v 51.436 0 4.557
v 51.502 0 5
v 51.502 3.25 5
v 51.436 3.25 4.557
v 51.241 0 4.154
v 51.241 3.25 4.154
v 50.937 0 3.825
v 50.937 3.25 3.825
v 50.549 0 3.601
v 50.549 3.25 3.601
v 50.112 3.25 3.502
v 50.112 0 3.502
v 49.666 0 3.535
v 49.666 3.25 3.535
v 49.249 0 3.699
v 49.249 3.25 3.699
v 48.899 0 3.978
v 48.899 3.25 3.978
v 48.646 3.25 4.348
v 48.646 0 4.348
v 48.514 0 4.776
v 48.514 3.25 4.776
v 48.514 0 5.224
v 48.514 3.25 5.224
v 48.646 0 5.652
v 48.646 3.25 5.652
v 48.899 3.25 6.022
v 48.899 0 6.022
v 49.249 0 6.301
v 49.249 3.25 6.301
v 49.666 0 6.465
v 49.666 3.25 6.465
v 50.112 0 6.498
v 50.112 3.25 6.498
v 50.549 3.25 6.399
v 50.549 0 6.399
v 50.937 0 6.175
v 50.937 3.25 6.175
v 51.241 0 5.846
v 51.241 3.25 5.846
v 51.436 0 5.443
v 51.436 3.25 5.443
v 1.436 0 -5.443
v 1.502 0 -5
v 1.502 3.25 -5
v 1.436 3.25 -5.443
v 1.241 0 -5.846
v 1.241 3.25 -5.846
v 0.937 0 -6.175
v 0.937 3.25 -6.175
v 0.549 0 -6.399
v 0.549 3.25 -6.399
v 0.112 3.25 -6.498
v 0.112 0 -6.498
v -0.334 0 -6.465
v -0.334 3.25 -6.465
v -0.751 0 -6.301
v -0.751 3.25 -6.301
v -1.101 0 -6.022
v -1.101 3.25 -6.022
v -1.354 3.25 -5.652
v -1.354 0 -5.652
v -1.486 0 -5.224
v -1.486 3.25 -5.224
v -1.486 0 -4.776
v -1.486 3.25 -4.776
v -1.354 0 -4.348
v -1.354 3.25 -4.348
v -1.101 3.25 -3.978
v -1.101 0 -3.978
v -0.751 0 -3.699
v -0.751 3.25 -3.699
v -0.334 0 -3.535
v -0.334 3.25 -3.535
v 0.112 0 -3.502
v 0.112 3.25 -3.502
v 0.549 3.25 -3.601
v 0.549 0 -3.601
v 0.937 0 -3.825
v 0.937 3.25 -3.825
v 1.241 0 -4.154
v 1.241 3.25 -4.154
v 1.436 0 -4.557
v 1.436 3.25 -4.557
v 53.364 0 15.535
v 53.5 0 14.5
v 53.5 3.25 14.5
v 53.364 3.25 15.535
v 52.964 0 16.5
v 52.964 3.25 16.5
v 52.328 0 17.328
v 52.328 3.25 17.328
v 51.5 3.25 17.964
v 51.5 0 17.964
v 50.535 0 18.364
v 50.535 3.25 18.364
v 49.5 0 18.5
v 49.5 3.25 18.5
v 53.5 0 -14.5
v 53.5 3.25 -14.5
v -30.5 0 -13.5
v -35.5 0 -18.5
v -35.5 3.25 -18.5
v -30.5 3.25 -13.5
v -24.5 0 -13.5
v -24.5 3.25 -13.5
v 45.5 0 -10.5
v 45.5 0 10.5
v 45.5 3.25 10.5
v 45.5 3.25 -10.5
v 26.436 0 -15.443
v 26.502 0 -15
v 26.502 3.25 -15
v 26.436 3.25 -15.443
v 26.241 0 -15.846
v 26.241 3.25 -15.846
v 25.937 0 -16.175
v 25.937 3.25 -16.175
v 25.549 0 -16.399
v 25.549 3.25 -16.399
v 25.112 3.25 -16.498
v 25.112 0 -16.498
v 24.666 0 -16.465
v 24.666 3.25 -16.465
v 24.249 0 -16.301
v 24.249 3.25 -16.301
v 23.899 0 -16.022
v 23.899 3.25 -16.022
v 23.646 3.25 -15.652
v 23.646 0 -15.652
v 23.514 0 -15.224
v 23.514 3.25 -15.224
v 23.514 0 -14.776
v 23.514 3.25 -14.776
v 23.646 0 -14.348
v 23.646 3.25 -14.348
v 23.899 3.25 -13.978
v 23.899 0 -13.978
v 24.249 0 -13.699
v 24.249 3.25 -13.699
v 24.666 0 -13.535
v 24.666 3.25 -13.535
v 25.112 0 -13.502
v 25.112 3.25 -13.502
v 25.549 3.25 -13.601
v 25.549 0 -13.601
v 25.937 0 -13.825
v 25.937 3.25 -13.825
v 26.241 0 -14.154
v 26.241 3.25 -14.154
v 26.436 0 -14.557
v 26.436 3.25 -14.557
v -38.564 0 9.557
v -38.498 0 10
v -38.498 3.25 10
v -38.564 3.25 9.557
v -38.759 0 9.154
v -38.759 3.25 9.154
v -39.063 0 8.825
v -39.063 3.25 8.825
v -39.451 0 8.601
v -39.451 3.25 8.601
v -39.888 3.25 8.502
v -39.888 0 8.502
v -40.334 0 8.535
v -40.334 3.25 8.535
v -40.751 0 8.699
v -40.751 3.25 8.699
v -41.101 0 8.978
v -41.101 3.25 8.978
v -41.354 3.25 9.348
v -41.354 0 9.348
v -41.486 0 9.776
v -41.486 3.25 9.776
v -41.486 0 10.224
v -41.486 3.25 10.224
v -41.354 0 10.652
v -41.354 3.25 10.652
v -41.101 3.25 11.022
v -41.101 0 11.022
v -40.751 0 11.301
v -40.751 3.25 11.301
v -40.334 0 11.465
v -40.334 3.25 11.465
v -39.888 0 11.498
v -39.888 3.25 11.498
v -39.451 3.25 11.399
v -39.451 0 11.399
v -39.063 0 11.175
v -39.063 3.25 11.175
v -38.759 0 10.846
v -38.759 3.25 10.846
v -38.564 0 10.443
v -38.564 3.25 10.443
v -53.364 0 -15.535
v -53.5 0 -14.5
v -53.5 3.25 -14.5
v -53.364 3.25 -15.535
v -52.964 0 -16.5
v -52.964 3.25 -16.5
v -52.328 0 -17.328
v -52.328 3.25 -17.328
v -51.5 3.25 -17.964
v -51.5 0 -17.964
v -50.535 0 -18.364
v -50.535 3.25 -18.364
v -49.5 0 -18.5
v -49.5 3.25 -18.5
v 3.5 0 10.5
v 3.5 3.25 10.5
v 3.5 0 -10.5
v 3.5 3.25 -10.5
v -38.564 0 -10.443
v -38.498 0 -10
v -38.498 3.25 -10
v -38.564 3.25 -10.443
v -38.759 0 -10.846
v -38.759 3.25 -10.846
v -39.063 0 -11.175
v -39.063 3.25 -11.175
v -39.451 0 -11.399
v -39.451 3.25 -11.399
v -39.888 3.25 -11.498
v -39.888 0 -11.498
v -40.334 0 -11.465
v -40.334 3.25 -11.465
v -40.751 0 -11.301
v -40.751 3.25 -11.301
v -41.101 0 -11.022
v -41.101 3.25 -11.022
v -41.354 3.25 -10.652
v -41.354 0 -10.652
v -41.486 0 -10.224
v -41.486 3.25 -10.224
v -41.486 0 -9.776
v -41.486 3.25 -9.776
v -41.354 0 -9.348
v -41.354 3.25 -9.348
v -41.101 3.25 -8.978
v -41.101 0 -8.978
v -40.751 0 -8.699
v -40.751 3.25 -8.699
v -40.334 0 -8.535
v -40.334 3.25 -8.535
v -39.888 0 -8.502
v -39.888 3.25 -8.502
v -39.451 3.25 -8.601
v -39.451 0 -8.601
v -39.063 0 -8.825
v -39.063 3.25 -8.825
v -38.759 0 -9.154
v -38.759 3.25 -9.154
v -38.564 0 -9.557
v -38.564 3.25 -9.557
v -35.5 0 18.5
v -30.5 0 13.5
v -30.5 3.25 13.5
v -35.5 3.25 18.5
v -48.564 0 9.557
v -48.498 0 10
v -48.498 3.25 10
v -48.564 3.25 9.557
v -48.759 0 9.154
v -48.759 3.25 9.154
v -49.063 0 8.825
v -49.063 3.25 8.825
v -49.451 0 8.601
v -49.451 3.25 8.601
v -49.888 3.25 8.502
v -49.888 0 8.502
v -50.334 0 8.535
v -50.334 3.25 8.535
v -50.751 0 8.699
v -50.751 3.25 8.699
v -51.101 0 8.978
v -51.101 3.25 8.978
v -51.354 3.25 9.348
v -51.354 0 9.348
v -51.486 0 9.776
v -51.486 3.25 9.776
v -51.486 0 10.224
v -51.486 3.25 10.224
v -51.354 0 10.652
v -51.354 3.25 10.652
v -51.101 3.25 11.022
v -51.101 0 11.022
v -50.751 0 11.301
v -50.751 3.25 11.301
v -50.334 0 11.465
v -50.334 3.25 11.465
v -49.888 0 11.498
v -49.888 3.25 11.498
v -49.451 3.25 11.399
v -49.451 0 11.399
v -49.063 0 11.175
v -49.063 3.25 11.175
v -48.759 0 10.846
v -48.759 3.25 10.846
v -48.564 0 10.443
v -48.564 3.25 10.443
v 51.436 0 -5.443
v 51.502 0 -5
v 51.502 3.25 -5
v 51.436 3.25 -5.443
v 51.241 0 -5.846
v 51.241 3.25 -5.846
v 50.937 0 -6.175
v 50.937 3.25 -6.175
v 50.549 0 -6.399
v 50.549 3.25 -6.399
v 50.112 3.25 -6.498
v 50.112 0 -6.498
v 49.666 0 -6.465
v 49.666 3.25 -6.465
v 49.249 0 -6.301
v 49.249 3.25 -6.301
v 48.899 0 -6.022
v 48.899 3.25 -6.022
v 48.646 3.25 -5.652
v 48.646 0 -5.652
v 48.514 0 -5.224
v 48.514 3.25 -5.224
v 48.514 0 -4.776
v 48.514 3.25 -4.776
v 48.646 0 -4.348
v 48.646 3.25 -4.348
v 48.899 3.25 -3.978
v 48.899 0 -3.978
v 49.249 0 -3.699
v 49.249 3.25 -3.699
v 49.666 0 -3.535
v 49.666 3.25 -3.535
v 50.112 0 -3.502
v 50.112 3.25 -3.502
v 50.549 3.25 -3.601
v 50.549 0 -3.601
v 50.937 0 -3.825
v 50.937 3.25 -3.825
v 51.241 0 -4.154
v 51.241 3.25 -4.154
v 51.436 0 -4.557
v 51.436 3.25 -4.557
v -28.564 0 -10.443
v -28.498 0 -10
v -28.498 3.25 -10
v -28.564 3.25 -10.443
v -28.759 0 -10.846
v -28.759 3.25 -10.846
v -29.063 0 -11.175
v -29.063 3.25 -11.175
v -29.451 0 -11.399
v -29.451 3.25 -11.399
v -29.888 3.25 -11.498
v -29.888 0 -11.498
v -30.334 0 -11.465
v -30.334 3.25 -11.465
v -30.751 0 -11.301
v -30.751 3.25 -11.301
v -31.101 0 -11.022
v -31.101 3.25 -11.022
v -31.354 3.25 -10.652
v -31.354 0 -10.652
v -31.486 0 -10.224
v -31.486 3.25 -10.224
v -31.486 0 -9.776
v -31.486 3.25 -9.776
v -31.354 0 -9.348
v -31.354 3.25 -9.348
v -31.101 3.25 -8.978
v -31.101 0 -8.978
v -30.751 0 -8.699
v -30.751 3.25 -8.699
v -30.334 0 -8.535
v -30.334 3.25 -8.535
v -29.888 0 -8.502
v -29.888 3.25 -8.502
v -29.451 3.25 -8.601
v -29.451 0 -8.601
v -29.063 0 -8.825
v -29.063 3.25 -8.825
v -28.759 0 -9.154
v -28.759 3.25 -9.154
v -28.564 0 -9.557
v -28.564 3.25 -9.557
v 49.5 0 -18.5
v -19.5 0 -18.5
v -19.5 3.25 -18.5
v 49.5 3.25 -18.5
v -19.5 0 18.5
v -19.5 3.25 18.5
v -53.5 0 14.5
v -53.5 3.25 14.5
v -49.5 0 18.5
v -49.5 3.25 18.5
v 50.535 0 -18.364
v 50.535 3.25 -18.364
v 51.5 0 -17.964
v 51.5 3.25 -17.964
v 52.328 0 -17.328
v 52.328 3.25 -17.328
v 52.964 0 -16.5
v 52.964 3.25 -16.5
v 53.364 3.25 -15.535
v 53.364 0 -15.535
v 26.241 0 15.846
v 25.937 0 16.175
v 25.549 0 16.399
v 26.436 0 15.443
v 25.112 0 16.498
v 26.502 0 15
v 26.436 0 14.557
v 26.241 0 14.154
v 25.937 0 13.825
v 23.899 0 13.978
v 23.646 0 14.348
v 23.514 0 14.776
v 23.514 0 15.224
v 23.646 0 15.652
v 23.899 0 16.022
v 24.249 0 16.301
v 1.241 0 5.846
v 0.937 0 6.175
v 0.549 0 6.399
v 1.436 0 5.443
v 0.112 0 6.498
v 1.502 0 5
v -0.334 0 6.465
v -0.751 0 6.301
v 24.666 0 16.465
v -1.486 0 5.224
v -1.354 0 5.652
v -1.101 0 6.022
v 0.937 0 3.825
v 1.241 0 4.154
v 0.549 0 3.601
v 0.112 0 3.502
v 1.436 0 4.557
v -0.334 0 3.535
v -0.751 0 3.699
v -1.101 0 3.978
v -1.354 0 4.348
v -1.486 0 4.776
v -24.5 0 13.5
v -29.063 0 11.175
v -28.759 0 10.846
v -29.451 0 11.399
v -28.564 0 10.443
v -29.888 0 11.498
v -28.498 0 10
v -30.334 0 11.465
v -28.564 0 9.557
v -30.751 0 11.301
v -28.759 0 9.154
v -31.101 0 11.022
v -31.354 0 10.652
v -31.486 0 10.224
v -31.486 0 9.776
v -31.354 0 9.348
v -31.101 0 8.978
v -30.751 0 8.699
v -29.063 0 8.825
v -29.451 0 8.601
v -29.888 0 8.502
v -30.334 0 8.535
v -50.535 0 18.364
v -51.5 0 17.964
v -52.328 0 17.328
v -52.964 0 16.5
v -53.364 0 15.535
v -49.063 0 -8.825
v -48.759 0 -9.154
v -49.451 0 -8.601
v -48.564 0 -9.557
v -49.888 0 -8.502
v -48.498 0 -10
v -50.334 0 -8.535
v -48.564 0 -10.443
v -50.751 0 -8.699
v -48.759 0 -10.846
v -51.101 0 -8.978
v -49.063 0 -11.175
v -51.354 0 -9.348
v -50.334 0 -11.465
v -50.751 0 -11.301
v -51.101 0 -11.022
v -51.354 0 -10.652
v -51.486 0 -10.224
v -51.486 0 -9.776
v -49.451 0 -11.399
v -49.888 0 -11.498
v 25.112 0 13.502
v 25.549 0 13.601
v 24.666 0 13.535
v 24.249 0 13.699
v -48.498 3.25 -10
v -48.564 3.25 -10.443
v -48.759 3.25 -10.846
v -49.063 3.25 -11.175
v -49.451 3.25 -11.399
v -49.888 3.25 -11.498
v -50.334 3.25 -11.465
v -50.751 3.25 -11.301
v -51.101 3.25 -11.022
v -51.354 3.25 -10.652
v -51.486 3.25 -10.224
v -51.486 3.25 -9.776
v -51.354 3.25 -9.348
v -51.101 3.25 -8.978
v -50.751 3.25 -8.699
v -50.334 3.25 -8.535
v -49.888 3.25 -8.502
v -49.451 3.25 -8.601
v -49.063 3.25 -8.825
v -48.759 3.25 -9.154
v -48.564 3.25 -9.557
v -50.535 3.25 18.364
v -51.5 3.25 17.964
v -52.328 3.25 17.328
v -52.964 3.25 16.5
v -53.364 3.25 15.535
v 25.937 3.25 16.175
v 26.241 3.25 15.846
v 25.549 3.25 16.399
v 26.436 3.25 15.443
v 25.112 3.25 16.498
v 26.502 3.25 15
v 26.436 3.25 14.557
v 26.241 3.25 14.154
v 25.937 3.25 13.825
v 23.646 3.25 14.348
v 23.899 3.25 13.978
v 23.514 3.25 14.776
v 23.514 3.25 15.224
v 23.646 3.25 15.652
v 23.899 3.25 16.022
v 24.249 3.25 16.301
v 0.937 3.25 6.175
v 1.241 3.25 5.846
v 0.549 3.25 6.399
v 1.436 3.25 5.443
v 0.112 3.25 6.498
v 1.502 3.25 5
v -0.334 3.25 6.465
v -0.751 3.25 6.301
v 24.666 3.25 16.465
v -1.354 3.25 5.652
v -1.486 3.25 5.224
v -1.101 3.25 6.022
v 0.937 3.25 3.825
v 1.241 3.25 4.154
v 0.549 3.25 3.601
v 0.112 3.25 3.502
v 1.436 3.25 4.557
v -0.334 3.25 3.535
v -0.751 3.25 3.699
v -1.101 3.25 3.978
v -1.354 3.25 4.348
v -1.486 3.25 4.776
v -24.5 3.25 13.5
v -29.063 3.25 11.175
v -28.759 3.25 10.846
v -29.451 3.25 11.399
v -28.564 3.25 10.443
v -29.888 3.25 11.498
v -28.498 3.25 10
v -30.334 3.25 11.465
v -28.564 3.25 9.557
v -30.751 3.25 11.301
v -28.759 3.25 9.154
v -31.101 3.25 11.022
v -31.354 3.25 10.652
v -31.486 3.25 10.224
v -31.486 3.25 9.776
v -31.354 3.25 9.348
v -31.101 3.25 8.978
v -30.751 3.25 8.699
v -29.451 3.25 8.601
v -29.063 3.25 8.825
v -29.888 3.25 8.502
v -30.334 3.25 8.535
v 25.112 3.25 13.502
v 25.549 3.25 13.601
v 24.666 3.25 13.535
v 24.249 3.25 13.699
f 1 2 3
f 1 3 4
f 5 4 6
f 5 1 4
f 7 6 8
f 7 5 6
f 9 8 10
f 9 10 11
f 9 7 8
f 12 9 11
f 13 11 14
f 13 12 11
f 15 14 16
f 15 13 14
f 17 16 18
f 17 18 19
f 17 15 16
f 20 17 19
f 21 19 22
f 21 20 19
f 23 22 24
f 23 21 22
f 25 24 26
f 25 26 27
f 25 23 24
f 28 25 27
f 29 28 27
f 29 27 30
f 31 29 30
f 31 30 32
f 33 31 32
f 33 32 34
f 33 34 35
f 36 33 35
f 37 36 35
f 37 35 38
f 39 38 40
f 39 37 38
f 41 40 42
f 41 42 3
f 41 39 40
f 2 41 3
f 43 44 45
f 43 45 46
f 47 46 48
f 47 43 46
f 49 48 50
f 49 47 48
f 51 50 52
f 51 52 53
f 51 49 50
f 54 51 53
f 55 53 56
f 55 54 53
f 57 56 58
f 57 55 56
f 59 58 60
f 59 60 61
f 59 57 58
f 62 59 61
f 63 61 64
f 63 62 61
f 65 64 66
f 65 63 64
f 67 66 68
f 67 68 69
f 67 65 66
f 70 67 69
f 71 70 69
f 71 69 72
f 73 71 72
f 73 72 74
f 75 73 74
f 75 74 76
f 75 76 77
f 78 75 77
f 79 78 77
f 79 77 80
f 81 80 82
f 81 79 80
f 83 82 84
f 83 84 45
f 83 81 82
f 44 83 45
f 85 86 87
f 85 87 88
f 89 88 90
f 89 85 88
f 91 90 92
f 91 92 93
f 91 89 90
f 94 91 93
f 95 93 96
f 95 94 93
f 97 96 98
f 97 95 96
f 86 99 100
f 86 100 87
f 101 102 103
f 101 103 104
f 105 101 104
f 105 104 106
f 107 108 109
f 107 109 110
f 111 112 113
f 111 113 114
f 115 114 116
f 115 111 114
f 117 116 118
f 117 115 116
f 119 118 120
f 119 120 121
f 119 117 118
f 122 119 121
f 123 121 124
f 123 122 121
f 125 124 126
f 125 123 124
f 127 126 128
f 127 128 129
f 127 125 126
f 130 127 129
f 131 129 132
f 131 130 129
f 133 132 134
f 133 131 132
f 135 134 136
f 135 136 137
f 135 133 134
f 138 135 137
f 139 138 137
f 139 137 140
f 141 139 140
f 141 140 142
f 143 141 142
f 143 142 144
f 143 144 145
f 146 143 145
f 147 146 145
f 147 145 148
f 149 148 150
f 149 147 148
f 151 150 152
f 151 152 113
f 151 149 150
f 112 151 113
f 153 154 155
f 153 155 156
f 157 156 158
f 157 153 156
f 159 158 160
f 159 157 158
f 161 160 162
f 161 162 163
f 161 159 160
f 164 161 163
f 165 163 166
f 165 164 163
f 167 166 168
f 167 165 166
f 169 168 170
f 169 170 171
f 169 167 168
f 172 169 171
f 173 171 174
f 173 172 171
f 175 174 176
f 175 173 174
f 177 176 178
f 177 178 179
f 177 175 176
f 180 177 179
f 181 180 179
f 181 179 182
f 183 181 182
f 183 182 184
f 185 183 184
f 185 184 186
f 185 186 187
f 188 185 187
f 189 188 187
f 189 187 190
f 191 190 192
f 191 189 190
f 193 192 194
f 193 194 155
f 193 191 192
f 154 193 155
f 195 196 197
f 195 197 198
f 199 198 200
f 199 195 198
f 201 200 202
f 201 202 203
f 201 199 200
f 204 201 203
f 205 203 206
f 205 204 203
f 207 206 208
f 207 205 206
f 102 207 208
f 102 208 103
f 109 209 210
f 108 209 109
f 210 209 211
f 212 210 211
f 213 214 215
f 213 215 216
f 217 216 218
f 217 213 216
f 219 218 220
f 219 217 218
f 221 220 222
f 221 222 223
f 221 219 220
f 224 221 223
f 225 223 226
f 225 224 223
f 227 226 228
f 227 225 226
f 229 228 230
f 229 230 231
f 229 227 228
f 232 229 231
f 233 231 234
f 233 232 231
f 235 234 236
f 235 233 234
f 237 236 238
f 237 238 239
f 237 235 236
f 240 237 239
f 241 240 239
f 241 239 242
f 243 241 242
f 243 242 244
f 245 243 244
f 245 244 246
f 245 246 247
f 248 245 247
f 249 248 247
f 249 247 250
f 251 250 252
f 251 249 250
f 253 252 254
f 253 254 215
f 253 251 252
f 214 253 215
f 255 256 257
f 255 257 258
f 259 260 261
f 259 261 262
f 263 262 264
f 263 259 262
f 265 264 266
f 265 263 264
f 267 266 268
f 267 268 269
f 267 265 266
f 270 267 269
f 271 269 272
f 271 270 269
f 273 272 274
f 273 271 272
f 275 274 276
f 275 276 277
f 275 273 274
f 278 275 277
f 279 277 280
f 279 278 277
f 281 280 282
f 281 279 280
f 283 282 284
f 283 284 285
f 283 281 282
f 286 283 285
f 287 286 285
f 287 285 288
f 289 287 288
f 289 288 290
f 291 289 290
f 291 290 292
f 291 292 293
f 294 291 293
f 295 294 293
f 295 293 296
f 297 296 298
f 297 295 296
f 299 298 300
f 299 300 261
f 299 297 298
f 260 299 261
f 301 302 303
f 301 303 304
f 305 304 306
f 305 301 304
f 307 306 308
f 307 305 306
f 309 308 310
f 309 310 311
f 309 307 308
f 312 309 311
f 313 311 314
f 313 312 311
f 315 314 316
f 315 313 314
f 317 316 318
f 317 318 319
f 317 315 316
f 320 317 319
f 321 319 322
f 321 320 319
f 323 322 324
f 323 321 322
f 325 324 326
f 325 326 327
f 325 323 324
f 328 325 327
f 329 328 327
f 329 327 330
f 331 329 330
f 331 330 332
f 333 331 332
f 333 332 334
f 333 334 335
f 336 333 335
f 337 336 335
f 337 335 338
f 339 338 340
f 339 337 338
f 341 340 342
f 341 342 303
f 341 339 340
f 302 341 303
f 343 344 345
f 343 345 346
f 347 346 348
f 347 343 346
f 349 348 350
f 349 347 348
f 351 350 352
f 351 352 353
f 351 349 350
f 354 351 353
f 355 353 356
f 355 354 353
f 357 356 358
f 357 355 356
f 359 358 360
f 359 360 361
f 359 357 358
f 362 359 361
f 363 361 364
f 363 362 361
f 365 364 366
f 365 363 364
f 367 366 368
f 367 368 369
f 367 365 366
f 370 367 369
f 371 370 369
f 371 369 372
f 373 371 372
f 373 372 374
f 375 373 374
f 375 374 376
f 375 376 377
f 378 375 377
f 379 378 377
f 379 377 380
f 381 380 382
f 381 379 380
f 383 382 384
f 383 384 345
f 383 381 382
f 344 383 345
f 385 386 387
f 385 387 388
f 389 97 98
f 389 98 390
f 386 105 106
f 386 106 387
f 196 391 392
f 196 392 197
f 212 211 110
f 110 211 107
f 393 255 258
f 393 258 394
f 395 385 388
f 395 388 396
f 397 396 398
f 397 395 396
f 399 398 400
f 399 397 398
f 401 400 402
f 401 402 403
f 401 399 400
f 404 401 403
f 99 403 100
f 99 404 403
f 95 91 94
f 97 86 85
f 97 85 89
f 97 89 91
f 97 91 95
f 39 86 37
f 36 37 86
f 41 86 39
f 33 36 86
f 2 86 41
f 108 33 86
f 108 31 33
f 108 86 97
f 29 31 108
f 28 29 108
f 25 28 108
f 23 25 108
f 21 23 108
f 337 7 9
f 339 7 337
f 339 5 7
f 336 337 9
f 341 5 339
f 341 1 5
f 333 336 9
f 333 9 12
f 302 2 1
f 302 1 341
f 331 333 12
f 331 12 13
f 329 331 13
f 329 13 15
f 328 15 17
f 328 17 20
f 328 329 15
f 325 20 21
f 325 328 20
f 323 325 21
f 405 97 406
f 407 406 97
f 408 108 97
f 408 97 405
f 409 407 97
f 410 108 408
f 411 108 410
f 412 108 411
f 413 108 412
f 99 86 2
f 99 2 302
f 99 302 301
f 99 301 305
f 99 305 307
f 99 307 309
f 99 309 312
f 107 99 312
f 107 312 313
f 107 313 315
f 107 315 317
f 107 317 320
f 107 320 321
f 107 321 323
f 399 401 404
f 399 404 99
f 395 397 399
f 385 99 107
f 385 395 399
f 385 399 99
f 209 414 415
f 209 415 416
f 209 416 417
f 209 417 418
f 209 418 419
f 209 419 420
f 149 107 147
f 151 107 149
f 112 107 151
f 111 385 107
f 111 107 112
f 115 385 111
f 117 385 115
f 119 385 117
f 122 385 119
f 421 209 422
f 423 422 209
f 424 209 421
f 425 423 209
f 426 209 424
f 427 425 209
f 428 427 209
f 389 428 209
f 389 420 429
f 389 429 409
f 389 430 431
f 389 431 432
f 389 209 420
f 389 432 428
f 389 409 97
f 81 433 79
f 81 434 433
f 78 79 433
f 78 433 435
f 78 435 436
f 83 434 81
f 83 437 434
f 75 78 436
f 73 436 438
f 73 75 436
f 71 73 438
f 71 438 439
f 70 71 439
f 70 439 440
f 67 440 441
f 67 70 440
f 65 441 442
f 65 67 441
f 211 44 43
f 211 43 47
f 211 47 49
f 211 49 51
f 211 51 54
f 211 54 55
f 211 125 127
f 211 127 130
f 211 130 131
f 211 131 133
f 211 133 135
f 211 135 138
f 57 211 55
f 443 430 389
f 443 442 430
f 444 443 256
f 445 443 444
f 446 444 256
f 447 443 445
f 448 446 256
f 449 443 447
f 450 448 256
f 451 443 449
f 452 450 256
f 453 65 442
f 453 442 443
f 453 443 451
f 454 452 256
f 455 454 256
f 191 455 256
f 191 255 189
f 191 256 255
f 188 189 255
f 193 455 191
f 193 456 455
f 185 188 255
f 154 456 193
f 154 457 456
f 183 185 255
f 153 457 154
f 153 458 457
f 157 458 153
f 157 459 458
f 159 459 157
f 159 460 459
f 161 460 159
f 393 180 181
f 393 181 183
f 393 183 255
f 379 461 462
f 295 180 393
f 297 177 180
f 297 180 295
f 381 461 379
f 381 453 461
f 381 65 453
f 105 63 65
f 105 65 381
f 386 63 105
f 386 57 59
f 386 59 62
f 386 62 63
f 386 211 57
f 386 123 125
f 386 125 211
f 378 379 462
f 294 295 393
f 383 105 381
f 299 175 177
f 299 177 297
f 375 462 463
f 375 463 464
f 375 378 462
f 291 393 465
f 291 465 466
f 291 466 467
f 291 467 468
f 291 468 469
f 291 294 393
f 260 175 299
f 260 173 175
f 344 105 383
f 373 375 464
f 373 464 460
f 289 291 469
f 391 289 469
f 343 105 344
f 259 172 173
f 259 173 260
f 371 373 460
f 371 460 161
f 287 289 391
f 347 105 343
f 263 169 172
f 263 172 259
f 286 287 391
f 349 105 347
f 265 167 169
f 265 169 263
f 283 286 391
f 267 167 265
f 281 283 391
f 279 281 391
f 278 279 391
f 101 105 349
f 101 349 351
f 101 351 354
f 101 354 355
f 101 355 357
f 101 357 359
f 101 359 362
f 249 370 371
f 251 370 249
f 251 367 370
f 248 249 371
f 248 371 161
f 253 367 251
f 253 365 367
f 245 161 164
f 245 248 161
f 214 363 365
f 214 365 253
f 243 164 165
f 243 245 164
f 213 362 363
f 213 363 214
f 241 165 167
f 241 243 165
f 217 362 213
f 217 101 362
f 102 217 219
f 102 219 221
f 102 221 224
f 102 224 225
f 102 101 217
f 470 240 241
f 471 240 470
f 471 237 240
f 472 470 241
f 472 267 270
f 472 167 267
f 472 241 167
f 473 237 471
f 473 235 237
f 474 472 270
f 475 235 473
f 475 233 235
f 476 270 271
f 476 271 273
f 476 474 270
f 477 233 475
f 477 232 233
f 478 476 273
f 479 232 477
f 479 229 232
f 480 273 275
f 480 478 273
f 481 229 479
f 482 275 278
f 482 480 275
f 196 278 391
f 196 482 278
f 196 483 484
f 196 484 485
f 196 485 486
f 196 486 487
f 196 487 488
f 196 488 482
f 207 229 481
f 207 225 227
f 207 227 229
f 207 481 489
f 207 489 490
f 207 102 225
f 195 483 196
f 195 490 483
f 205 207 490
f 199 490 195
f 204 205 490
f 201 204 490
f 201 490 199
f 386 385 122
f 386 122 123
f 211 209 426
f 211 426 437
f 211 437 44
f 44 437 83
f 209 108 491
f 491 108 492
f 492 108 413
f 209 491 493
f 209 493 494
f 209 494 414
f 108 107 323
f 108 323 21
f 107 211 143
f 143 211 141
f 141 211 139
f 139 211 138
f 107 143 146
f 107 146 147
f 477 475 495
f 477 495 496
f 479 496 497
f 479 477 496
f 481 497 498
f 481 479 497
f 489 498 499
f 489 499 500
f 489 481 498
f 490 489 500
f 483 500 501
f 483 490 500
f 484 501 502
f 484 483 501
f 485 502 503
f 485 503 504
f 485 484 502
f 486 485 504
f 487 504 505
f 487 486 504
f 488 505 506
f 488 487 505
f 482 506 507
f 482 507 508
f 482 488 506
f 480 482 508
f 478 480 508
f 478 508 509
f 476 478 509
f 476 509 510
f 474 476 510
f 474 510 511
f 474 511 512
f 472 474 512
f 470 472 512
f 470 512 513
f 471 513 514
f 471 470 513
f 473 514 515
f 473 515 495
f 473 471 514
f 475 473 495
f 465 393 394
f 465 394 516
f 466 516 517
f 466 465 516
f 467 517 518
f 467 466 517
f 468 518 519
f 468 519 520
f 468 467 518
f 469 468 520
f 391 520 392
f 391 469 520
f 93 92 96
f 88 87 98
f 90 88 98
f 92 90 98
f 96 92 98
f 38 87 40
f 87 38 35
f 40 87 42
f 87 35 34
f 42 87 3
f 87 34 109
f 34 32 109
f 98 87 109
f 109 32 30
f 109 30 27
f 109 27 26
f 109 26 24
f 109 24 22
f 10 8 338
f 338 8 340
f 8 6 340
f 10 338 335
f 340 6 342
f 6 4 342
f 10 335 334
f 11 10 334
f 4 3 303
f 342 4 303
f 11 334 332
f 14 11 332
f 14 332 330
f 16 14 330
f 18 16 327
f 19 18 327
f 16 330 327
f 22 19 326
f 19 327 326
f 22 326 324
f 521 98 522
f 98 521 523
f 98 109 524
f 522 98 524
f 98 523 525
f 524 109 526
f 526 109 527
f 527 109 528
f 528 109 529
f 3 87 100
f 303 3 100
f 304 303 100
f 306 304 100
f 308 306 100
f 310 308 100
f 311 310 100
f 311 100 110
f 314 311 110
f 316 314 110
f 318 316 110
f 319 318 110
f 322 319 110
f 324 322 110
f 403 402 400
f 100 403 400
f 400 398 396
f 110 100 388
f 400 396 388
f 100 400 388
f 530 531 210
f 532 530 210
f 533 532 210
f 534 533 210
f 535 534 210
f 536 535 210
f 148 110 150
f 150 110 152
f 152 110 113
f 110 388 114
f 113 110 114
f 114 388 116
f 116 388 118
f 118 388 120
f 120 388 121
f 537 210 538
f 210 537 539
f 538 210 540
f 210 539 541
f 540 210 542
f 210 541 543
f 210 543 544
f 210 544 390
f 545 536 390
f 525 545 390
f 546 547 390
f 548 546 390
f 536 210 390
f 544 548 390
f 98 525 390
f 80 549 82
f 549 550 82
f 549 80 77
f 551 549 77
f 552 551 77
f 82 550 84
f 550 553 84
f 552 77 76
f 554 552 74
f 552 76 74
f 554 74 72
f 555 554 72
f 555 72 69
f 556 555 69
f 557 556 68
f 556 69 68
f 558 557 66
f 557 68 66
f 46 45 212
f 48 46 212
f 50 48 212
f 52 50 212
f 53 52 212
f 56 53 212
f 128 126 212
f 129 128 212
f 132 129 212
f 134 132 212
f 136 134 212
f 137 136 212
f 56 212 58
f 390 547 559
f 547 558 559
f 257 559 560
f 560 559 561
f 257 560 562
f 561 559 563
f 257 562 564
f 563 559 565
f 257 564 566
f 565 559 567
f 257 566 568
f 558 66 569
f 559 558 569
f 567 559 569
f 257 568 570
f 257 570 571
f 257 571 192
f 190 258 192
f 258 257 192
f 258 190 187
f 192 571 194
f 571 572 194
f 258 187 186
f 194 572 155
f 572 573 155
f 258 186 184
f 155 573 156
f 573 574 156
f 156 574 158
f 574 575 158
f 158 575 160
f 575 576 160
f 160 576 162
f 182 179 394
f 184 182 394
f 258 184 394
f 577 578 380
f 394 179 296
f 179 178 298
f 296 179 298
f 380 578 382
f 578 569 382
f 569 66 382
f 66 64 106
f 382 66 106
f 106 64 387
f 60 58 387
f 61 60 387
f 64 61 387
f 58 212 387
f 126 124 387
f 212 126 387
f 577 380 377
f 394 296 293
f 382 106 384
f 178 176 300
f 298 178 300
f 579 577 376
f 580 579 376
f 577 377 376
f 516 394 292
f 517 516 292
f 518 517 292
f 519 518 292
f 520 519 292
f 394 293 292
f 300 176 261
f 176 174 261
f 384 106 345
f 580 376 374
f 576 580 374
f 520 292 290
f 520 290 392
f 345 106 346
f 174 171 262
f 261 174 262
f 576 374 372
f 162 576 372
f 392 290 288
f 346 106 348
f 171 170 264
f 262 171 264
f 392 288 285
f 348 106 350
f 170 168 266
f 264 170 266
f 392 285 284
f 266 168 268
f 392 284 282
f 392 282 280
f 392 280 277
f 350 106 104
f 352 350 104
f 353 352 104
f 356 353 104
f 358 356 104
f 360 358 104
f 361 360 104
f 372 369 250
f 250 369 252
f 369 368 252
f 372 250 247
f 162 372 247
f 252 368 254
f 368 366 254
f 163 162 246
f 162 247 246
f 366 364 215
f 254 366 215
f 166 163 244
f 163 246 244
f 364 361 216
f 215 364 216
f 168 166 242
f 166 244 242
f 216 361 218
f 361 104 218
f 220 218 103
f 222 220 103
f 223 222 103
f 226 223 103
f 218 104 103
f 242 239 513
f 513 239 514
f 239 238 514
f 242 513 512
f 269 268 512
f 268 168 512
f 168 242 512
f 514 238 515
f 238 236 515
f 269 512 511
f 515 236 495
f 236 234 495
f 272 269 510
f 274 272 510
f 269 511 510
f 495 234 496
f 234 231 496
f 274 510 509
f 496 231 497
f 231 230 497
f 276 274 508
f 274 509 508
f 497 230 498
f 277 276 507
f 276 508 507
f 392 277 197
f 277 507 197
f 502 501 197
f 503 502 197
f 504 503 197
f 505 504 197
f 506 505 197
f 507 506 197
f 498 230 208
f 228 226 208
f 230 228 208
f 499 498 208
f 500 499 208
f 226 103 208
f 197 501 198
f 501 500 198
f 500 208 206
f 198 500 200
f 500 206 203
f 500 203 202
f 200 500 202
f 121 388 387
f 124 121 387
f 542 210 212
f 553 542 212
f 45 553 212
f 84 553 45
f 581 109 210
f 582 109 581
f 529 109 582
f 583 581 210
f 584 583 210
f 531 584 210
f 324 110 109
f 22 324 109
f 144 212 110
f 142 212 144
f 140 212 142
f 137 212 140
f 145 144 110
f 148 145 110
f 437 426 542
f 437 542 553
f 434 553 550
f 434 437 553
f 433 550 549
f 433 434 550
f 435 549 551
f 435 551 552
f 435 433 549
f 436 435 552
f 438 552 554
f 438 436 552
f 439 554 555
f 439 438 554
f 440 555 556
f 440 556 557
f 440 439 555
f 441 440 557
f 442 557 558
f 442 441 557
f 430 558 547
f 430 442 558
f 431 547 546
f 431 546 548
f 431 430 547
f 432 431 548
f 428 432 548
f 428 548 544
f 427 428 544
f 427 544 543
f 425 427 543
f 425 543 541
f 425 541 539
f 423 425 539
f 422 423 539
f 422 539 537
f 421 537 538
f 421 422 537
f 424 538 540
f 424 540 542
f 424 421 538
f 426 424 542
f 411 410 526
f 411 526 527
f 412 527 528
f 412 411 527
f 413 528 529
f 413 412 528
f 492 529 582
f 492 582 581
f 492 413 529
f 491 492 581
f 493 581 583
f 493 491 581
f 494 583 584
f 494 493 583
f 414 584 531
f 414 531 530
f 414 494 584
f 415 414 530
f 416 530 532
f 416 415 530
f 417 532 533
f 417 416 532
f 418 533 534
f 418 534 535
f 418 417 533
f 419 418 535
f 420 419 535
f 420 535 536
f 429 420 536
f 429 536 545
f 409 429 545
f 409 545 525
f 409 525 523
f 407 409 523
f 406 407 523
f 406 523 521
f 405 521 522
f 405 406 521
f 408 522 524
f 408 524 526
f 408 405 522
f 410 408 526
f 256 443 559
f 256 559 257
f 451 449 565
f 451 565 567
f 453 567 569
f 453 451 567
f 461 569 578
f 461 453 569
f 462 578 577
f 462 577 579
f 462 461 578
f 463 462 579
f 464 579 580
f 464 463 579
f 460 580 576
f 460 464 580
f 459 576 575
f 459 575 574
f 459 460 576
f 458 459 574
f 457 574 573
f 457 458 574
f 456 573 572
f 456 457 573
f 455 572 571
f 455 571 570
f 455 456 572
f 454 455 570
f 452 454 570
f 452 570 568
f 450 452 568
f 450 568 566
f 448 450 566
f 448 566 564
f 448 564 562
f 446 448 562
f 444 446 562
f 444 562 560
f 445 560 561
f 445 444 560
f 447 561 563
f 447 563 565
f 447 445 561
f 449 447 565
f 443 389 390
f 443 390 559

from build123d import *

# Parameters (mm, degrees)
SKETCH1_R           = 1.5025
SKETCH1_W           = 42
SKETCH1_H           = 21
BOSS_EXTRUDE1_DEPTH = 3.25


with BuildPart() as part:
    # Sketch1 → Boss-Extrude1 (new body)
    with BuildSketch(Plane(origin=(0, 0, 0), x_dir=(1, 0, 0), z_dir=(0, 1, 0))):
        with BuildLine():
            Line((-49.5, 18.5), (-35.5, 18.5))
            Line((-35.5, 18.5), (-30.5, 13.5))
            Line((-30.5, 13.5), (-24.5, 13.5))
            Line((-24.5, 13.5), (-19.5, 18.5))
            Line((-19.5, 18.5), (49.5, 18.5))
            ThreePointArc((49.5, 18.5), (52.328427125, 17.328427125), (53.5, 14.5))
            Line((53.5, 14.5), (53.5, -14.5))
            ThreePointArc((53.5, -14.5), (52.328427125, -17.328427125), (49.5, -18.5))
            Line((49.5, -18.5), (-19.5, -18.5))
            Line((-19.5, -18.5), (-24.5, -13.5))
            Line((-24.5, -13.5), (-30.5, -13.5))
            Line((-30.5, -13.5), (-35.5, -18.5))
            Line((-35.5, -18.5), (-49.5, -18.5))
            ThreePointArc((-49.5, -18.5), (-52.328427125, -17.328427125), (-53.5, -14.5))
            Line((-53.5, -14.5), (-53.5, 14.5))
            ThreePointArc((-53.5, 14.5), (-52.328427125, 17.328427125), (-49.5, 18.5))
        make_face()
        with Locations((25, -15)):
            Circle(SKETCH1_R, mode=Mode.SUBTRACT)
        with Locations((-40, -10)):
            Circle(SKETCH1_R, mode=Mode.SUBTRACT)
        with Locations((-30, -10)):
            Circle(SKETCH1_R, mode=Mode.SUBTRACT)
        with Locations((0, -5)):
            Circle(SKETCH1_R, mode=Mode.SUBTRACT)
        with Locations((50, -5)):
            Circle(SKETCH1_R, mode=Mode.SUBTRACT)
        with Locations((0, 5)):
            Circle(SKETCH1_R, mode=Mode.SUBTRACT)
        with Locations((50, 5)):
            Circle(SKETCH1_R, mode=Mode.SUBTRACT)
        with Locations((-40, 10)):
            Circle(SKETCH1_R, mode=Mode.SUBTRACT)
        with Locations((-30, 10)):
            Circle(SKETCH1_R, mode=Mode.SUBTRACT)
        with Locations((25, 15)):
            Circle(SKETCH1_R, mode=Mode.SUBTRACT)
        with Locations((-50, -10)):
            Circle(SKETCH1_R, mode=Mode.SUBTRACT)
        with Locations((-50, 10)):
            Circle(SKETCH1_R, mode=Mode.SUBTRACT)
        with Locations((24.5, 0)):
            Rectangle(SKETCH1_W, SKETCH1_H, mode=Mode.SUBTRACT)
    extrude(amount=BOSS_EXTRUDE1_DEPTH)


solid = part.part
